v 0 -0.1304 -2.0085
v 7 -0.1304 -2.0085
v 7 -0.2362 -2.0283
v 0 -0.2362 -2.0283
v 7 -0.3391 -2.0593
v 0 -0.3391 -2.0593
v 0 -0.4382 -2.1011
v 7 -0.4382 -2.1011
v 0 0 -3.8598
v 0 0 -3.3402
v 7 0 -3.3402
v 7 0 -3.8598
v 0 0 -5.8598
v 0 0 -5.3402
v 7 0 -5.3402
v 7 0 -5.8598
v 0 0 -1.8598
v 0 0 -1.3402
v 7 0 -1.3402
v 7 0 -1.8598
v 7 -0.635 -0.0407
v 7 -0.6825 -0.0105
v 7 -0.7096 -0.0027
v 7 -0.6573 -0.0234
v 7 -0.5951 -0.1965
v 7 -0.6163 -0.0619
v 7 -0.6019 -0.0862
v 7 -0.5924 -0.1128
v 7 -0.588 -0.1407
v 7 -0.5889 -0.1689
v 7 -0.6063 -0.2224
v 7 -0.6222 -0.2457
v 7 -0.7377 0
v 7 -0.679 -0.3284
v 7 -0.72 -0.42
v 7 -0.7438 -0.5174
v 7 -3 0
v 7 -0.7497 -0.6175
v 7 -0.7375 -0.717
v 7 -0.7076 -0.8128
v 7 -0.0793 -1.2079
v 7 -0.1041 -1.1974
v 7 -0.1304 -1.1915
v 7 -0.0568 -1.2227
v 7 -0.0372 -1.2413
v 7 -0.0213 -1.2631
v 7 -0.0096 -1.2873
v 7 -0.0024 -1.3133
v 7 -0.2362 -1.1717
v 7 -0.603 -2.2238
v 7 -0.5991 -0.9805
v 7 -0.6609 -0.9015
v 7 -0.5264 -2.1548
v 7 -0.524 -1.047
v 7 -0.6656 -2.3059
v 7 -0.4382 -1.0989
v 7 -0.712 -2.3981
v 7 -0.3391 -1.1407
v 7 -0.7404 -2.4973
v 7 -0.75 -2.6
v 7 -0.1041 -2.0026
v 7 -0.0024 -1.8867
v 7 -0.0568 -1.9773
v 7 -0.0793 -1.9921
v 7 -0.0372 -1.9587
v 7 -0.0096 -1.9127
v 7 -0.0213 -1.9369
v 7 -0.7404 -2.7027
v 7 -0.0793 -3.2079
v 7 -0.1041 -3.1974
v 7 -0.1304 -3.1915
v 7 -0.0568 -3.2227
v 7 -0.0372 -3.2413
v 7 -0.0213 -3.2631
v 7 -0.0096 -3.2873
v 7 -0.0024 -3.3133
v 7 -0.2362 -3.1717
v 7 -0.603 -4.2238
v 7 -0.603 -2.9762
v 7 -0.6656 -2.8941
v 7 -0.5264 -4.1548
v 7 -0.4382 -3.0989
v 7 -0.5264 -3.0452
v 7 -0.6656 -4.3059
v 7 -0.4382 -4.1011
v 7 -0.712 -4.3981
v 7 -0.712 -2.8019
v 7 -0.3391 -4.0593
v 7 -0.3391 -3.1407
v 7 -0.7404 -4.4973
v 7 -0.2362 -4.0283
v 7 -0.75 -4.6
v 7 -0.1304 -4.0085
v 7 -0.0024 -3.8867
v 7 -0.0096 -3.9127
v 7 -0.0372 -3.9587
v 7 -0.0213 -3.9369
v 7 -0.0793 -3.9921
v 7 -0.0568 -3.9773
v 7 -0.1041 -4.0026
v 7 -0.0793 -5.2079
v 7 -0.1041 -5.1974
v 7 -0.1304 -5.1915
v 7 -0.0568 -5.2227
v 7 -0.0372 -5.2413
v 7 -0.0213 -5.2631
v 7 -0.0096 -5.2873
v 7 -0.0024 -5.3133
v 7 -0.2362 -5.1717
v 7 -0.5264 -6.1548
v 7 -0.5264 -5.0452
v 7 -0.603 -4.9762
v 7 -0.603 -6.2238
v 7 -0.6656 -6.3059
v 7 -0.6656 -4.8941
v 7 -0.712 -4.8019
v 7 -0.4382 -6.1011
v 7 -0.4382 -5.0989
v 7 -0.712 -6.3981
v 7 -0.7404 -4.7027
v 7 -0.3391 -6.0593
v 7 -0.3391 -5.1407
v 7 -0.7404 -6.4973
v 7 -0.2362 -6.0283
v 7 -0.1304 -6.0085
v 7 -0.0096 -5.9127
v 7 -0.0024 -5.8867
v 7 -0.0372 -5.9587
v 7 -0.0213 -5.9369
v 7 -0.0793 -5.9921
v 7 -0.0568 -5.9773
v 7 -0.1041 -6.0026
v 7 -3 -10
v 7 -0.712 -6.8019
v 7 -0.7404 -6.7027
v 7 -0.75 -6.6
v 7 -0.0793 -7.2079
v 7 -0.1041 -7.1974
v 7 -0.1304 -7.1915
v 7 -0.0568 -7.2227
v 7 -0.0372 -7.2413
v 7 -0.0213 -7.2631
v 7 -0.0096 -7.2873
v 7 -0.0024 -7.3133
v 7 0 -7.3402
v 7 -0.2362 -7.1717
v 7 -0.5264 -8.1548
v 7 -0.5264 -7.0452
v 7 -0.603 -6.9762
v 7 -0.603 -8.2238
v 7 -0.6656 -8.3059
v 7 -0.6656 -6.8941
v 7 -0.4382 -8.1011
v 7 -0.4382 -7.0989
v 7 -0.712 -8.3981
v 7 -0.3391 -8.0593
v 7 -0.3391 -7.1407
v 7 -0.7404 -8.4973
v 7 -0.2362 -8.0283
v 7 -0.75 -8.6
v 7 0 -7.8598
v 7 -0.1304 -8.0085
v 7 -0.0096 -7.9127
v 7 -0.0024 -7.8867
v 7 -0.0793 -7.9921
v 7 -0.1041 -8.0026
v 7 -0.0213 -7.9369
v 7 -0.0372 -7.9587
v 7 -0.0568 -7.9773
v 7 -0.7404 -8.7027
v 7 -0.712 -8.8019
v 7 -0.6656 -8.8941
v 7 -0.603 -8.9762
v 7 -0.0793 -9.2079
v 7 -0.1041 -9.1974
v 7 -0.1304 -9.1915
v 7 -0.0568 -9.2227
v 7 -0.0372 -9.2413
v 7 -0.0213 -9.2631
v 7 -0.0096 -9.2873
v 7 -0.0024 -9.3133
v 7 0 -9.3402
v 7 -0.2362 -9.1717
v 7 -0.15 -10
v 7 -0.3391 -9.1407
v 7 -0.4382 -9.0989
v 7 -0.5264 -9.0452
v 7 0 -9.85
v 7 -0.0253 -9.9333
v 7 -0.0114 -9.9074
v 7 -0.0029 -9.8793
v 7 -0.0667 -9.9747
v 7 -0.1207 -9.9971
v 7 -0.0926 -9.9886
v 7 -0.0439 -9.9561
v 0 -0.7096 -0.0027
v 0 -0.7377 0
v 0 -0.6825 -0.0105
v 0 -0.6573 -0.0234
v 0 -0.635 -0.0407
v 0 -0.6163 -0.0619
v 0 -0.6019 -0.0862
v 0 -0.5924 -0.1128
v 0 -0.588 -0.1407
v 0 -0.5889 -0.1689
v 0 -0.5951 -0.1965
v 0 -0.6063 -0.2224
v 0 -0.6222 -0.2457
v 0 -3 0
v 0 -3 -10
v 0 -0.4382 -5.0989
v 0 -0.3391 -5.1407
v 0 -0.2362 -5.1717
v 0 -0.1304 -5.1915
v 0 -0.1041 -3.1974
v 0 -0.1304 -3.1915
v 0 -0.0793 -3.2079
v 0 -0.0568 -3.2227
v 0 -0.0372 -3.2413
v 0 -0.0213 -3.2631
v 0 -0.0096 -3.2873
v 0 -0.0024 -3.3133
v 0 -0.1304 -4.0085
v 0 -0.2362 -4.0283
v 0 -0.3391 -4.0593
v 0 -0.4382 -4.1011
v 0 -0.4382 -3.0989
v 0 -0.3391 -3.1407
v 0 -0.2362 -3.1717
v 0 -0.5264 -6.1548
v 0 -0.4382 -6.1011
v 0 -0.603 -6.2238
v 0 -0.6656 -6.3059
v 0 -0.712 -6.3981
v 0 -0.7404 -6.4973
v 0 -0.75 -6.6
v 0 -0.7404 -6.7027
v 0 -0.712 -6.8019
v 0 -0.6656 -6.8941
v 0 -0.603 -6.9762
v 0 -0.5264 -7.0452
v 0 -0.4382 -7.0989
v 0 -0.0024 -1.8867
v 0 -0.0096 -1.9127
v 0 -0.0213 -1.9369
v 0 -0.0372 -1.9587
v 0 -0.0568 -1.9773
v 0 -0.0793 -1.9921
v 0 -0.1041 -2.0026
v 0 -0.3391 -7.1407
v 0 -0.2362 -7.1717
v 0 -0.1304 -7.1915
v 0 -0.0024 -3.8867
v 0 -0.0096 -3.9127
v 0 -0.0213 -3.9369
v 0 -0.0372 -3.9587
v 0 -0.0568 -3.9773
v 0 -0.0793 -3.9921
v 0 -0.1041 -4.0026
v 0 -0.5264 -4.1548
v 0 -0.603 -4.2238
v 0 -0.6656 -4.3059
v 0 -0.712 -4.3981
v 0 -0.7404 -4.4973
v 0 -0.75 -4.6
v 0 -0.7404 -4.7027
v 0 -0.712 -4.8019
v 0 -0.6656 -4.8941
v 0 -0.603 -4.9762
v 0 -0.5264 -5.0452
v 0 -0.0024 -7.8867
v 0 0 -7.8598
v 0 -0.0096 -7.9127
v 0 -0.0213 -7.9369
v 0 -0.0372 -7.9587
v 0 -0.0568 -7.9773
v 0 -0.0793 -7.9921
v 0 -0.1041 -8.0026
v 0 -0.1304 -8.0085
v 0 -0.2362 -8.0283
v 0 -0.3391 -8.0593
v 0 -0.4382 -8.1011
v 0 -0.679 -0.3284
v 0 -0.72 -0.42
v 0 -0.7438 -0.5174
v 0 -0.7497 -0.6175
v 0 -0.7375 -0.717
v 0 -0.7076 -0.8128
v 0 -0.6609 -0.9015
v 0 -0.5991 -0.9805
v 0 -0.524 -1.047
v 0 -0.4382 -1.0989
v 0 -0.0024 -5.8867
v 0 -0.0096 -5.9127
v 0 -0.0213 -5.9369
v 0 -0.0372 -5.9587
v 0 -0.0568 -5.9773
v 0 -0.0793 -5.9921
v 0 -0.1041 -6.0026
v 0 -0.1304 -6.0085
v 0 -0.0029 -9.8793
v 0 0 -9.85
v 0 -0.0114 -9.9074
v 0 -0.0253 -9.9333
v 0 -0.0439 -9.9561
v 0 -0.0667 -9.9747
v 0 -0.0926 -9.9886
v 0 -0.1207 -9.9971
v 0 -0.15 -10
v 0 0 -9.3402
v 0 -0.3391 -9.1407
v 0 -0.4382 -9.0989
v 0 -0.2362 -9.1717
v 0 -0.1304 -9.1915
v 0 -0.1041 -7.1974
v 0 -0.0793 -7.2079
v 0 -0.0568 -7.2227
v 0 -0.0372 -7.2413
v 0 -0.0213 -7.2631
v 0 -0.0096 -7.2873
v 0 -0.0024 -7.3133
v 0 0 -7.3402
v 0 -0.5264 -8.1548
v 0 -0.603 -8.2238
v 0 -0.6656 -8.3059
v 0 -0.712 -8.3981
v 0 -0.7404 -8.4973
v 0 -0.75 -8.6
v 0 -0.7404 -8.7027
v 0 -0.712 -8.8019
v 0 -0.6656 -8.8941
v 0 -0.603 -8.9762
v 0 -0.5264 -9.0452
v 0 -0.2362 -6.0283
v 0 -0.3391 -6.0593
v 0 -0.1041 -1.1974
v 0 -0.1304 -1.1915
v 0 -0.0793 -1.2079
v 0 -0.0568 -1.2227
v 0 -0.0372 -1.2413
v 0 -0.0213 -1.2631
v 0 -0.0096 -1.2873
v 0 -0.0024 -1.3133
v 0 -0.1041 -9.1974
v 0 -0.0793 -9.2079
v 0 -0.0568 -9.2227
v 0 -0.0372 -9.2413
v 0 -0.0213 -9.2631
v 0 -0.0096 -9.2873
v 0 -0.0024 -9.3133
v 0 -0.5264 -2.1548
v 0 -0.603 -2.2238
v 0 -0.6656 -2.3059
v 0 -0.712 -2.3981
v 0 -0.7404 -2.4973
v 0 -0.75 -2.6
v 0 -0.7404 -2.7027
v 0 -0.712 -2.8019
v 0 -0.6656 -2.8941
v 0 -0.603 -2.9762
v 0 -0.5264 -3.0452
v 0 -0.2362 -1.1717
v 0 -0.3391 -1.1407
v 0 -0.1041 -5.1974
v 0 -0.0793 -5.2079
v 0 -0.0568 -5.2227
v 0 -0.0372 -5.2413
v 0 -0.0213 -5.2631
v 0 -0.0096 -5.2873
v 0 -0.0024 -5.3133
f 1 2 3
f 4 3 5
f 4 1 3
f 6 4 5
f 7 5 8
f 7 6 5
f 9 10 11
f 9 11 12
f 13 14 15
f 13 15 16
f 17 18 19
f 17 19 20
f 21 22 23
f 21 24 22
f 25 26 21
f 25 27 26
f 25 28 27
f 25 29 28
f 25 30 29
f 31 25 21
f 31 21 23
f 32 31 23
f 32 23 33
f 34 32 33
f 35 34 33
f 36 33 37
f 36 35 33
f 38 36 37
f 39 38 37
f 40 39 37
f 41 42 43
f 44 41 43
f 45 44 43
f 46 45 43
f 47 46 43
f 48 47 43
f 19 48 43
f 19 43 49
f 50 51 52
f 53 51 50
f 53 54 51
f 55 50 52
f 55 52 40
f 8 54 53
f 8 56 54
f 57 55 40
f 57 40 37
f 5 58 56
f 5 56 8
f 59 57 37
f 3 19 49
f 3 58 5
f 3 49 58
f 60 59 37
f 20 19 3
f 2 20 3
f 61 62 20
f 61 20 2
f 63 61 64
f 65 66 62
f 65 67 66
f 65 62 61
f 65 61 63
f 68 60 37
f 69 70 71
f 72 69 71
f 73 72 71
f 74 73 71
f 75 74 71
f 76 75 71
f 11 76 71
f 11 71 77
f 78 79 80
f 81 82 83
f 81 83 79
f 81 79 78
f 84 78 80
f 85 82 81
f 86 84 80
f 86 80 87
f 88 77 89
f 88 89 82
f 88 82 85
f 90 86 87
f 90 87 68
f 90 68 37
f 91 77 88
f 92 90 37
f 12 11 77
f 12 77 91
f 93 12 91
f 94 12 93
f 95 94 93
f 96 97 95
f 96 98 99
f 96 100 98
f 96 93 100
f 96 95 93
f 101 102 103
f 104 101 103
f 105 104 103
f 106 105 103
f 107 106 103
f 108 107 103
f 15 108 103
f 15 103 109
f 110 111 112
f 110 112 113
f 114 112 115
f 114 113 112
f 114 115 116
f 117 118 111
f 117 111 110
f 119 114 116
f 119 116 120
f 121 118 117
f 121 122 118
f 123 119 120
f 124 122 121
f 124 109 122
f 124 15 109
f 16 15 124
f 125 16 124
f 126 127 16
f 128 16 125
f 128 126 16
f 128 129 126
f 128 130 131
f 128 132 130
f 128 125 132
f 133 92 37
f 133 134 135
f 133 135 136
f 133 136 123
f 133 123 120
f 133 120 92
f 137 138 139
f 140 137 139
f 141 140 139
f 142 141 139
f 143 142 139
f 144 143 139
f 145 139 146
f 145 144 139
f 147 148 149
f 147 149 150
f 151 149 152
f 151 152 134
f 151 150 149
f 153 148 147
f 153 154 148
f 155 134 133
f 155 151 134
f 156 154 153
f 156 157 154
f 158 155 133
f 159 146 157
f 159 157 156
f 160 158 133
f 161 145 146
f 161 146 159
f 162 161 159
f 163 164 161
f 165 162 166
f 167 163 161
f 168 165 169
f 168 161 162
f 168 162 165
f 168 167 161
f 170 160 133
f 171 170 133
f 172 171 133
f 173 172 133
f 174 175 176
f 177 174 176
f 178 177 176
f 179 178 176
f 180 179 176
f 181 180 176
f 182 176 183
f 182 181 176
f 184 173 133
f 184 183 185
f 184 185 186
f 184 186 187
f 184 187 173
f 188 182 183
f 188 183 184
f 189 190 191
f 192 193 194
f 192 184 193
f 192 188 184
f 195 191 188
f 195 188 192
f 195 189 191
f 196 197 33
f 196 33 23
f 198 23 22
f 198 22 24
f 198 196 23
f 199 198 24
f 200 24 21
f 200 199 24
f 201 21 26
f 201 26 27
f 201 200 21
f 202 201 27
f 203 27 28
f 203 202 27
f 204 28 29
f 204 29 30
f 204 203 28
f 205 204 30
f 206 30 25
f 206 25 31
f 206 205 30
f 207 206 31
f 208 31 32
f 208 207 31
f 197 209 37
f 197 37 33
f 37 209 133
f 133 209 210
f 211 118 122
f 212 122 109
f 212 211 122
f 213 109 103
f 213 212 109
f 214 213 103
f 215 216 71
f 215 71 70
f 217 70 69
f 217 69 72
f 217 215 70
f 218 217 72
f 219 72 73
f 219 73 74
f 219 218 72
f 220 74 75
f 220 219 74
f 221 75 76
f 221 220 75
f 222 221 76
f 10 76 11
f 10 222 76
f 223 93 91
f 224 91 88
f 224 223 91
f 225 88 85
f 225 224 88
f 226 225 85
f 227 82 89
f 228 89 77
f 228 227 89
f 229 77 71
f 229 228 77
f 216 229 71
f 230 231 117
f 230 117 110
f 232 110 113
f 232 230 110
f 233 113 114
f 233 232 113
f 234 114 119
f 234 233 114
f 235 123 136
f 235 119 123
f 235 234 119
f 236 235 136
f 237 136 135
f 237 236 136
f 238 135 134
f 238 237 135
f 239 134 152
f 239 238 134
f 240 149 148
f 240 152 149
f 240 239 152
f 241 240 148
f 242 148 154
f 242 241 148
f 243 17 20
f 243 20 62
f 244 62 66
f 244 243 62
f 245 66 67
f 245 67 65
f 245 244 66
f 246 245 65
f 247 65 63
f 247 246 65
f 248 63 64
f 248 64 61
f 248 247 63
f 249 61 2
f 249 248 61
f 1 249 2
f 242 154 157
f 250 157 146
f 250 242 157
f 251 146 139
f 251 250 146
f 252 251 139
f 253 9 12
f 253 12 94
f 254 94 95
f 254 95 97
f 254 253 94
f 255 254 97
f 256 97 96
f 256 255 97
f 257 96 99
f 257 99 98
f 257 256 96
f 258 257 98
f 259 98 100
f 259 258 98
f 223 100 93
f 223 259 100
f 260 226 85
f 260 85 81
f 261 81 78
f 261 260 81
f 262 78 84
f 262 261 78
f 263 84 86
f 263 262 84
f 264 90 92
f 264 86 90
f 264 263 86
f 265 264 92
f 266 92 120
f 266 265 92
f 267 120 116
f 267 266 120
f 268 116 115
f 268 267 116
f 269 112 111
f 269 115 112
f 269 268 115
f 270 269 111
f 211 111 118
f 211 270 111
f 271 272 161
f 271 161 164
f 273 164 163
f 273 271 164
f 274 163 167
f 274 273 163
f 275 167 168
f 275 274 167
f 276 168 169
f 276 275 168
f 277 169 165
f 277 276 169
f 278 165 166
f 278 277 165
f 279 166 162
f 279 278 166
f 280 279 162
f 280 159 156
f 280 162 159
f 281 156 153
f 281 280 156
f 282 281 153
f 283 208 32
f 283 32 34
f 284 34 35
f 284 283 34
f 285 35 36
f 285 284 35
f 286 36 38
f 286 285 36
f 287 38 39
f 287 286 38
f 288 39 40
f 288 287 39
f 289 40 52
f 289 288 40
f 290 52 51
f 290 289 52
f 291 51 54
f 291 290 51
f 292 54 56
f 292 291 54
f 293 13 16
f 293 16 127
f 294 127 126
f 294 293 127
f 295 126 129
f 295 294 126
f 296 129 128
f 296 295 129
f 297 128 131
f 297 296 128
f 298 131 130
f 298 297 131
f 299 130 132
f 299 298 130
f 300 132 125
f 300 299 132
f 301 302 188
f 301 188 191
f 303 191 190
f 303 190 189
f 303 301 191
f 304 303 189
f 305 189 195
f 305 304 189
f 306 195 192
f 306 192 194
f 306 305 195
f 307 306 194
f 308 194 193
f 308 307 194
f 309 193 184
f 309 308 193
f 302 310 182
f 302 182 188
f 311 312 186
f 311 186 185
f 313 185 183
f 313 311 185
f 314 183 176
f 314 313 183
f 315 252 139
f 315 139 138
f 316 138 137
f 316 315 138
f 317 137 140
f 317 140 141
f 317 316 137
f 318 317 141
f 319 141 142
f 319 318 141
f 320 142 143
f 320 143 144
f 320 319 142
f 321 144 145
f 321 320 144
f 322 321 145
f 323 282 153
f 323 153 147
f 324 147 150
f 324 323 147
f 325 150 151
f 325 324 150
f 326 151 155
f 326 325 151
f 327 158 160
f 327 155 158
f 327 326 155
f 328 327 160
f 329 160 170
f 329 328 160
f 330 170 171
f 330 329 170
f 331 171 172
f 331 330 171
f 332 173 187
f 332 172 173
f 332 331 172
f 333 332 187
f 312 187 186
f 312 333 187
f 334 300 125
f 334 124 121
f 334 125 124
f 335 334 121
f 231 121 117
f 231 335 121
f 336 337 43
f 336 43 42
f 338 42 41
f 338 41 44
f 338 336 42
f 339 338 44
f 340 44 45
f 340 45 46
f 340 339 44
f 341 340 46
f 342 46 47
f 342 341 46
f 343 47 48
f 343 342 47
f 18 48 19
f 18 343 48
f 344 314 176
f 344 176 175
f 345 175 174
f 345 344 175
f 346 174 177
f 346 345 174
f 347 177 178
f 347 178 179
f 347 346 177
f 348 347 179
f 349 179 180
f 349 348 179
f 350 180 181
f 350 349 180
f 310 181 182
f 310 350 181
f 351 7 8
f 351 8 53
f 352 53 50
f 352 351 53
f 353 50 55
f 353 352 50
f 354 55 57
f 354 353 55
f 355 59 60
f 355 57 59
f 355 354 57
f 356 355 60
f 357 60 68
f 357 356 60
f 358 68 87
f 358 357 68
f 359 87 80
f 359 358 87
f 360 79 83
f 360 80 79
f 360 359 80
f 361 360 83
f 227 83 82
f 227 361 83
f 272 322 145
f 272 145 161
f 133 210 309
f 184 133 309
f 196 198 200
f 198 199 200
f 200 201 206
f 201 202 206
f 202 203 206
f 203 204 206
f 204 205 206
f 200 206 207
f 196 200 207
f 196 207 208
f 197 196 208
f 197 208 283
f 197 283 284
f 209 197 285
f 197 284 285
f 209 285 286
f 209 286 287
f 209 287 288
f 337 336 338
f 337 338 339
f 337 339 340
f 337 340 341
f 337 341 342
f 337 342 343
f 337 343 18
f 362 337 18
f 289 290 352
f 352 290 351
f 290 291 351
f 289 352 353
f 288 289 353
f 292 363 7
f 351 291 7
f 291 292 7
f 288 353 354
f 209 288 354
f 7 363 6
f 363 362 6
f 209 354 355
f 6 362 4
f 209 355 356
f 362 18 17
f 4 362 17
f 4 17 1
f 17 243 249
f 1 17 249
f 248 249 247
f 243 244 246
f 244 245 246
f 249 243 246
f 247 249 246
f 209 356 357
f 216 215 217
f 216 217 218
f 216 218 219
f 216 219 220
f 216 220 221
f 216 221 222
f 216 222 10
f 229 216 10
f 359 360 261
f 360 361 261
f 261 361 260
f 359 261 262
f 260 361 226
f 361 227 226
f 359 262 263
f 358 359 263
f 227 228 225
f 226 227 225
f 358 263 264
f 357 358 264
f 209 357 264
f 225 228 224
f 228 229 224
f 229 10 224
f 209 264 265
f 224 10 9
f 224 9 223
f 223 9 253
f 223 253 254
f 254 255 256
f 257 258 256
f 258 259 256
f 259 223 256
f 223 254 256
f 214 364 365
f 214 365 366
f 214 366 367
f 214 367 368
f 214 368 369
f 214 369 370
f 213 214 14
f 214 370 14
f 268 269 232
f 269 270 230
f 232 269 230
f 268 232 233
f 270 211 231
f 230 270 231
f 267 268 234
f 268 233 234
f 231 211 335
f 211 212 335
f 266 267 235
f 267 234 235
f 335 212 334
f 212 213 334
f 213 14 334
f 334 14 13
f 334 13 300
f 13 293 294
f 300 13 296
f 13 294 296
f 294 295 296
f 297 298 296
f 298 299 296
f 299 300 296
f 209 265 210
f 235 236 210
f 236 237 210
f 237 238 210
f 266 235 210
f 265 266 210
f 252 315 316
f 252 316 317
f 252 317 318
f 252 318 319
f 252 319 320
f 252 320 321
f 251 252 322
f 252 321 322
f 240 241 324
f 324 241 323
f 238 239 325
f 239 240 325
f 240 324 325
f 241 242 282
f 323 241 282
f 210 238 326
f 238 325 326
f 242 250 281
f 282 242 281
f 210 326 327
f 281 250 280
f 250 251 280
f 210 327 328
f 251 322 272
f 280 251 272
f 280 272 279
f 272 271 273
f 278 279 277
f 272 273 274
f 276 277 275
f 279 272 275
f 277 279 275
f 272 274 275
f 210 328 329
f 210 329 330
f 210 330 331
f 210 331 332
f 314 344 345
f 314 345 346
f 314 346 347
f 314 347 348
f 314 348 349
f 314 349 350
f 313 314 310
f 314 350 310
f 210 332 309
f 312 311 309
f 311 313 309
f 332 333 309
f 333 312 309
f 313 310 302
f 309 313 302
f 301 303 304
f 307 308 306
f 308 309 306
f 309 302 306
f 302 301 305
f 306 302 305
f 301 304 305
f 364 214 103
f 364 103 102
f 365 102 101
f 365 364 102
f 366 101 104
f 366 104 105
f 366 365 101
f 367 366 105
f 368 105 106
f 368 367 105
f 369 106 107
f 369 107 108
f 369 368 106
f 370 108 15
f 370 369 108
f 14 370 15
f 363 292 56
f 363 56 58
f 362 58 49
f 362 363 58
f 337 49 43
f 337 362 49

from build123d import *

# Parameters (mm, degrees)
SKETCH2_W           = 10
SKETCH2_H           = 3
BOSS_EXTRUDE1_DEPTH = 7
CUT_EXTRUDE2_DEPTH  = 13.56980509
LPATTERN2_COUNT     = 10
LPATTERN2_PITCH     = 2
FILLET2_START       = -1
FILLET2_DEPTH       = 9


with BuildPart() as part:
    # Sketch2 → Boss-Extrude1 (new body)
    with BuildSketch(Plane(origin=(0, 0, 0), x_dir=(0, 0, -1), z_dir=(1, 0, 0))):
        with Locations((5, -1.5)):
            Rectangle(SKETCH2_W, SKETCH2_H)
    extrude(amount=BOSS_EXTRUDE1_DEPTH)

    # Sketch1 → Cut-Extrude2 (cut, through all)
    with BuildSketch(Plane(origin=(0, 0, 0), x_dir=(0, 0, -1), z_dir=(1, 0, 0))):
        with BuildLine():
            ThreePointArc((0.10112359, -0.438202237), (0.045620517, -0.221237163), (0.080384758, 0))
            Line((0.080384758, 0), (0, 0))
            ThreePointArc((0, 0), (0.025608803, -0.224859501), (0.10112359, -0.438202237))
        make_face()
        with BuildLine():
            ThreePointArc((1.155, -0.195), (1.146082164, -0.095907769), (1.119615242, 0))
            Line((1.119615242, 0), (0.080384758, 0))
            ThreePointArc((0.080384758, 0), (0.045620517, -0.221237163), (0.10112359, -0.438202237))
            ThreePointArc((0.10112359, -0.438202237), (0.6, -0.75), (1.09887641, -0.438202237))
            ThreePointArc((1.09887641, -0.438202237), (1.140787115, -0.319797021), (1.155, -0.195))
        make_face()
        with BuildLine():
            Line((0.080384758, 0), (1.119615242, 0))
            ThreePointArc((1.119615242, 0), (0.6, 0.36), (0.080384758, 0))
        make_face()
        with BuildLine():
            ThreePointArc((1.09887641, -0.438202237), (1.174391197, -0.224859501), (1.2, 0))
            Line((1.2, 0), (1.119615242, 0))
            ThreePointArc((1.119615242, 0), (1.146082164, -0.095907769), (1.155, -0.195))
            ThreePointArc((1.155, -0.195), (1.140787115, -0.319797021), (1.09887641, -0.438202237))
        make_face()
    cut_extrude2 = extrude(amount=CUT_EXTRUDE2_DEPTH, mode=Mode.SUBTRACT)

    # LPattern2: Cut-Extrude2 ×10
    with Locations(*[(0, 0, -i * LPATTERN2_PITCH) for i in range(1, LPATTERN2_COUNT)]):
        add(cut_extrude2, mode=Mode.SUBTRACT)

    # Fillet2: read off the stored shape, not the designer's step
    # Fillet2 outline → Fillet2 (cut)
    with BuildSketch(Plane.YZ.offset(FILLET2_START)):
        with BuildLine():
            Line((0, -10), (0, -9.85))
            ThreePointArc((0, -9.85), (-0.043933983, -9.956066017), (-0.15, -10))
            Line((-0.15, -10), (0, -10))
        make_face()
        with BuildLine():
            ThreePointArc((-0.130434783, -9.191456891), (-0.037228588, -9.241268354), (0, -9.340175425))
            Line((0, -9.340175425), (0, -9.2))
            ThreePointArc((0, -9.2), (-0.065357129, -9.197861937), (-0.130434783, -9.191456891))
        make_face()
        with BuildLine():
            Line((0, -8), (0, -7.859824575))
            ThreePointArc((0, -7.859824575), (-0.037228588, -7.958731646), (-0.130434783, -8.008543109))
            ThreePointArc((-0.130434783, -8.008543109), (-0.065357129, -8.002138063), (0, -8))
        make_face()
        with BuildLine():
            ThreePointArc((-0.130434783, -7.191456891), (-0.037228588, -7.241268354), (0, -7.340175425))
            Line((0, -7.340175425), (0, -7.2))
            ThreePointArc((0, -7.2), (-0.065357129, -7.197861937), (-0.130434783, -7.191456891))
        make_face()
        with BuildLine():
            Line((0, -6), (0, -5.859824575))
            ThreePointArc((0, -5.859824575), (-0.037228588, -5.958731646), (-0.130434783, -6.008543109))
            ThreePointArc((-0.130434783, -6.008543109), (-0.065357129, -6.002138063), (0, -6))
        make_face()
        with BuildLine():
            ThreePointArc((-0.130434783, -5.191456891), (-0.037228588, -5.241268354), (0, -5.340175425))
            Line((0, -5.340175425), (0, -5.2))
            ThreePointArc((0, -5.2), (-0.065357129, -5.197861937), (-0.130434783, -5.191456891))
        make_face()
        with BuildLine():
            Line((0, -4), (0, -3.859824575))
            ThreePointArc((0, -3.859824575), (-0.037228588, -3.958731646), (-0.130434783, -4.008543109))
            ThreePointArc((-0.130434783, -4.008543109), (-0.065357129, -4.002138063), (0, -4))
        make_face()
        with BuildLine():
            ThreePointArc((-0.130434783, -3.191456891), (-0.037228588, -3.241268354), (0, -3.340175425))
            Line((0, -3.340175425), (0, -3.2))
            ThreePointArc((0, -3.2), (-0.065357129, -3.197861937), (-0.130434783, -3.191456891))
        make_face()
        with BuildLine():
            Line((0, -2), (0, -1.859824575))
            ThreePointArc((0, -1.859824575), (-0.037228588, -1.958731646), (-0.130434783, -2.008543109))
            ThreePointArc((-0.130434783, -2.008543109), (-0.065357129, -2.002138063), (0, -2))
        make_face()
        with BuildLine():
            ThreePointArc((-0.737701575, 0), (-0.601941305, -0.086210119), (-0.622233155, -0.245744681))
            ThreePointArc((-0.622233155, -0.245744681), (-0.537928158, -0.163622551), (-0.438202247, -0.101123596))
            ThreePointArc((-0.438202247, -0.101123596), (-0.224859507, -0.025608804), (0, 0))
            Line((0, 0), (-0.737701575, 0))
        make_face()
        with BuildLine():
            ThreePointArc((-0.130434783, -1.191456891), (-0.037228588, -1.241268354), (0, -1.340175425))
            Line((0, -1.340175425), (0, -1.2))
            ThreePointArc((0, -1.2), (-0.065357129, -1.197861937), (-0.130434783, -1.191456891))
        make_face()
    extrude(amount=FILLET2_DEPTH, mode=Mode.SUBTRACT)


solid = part.part
